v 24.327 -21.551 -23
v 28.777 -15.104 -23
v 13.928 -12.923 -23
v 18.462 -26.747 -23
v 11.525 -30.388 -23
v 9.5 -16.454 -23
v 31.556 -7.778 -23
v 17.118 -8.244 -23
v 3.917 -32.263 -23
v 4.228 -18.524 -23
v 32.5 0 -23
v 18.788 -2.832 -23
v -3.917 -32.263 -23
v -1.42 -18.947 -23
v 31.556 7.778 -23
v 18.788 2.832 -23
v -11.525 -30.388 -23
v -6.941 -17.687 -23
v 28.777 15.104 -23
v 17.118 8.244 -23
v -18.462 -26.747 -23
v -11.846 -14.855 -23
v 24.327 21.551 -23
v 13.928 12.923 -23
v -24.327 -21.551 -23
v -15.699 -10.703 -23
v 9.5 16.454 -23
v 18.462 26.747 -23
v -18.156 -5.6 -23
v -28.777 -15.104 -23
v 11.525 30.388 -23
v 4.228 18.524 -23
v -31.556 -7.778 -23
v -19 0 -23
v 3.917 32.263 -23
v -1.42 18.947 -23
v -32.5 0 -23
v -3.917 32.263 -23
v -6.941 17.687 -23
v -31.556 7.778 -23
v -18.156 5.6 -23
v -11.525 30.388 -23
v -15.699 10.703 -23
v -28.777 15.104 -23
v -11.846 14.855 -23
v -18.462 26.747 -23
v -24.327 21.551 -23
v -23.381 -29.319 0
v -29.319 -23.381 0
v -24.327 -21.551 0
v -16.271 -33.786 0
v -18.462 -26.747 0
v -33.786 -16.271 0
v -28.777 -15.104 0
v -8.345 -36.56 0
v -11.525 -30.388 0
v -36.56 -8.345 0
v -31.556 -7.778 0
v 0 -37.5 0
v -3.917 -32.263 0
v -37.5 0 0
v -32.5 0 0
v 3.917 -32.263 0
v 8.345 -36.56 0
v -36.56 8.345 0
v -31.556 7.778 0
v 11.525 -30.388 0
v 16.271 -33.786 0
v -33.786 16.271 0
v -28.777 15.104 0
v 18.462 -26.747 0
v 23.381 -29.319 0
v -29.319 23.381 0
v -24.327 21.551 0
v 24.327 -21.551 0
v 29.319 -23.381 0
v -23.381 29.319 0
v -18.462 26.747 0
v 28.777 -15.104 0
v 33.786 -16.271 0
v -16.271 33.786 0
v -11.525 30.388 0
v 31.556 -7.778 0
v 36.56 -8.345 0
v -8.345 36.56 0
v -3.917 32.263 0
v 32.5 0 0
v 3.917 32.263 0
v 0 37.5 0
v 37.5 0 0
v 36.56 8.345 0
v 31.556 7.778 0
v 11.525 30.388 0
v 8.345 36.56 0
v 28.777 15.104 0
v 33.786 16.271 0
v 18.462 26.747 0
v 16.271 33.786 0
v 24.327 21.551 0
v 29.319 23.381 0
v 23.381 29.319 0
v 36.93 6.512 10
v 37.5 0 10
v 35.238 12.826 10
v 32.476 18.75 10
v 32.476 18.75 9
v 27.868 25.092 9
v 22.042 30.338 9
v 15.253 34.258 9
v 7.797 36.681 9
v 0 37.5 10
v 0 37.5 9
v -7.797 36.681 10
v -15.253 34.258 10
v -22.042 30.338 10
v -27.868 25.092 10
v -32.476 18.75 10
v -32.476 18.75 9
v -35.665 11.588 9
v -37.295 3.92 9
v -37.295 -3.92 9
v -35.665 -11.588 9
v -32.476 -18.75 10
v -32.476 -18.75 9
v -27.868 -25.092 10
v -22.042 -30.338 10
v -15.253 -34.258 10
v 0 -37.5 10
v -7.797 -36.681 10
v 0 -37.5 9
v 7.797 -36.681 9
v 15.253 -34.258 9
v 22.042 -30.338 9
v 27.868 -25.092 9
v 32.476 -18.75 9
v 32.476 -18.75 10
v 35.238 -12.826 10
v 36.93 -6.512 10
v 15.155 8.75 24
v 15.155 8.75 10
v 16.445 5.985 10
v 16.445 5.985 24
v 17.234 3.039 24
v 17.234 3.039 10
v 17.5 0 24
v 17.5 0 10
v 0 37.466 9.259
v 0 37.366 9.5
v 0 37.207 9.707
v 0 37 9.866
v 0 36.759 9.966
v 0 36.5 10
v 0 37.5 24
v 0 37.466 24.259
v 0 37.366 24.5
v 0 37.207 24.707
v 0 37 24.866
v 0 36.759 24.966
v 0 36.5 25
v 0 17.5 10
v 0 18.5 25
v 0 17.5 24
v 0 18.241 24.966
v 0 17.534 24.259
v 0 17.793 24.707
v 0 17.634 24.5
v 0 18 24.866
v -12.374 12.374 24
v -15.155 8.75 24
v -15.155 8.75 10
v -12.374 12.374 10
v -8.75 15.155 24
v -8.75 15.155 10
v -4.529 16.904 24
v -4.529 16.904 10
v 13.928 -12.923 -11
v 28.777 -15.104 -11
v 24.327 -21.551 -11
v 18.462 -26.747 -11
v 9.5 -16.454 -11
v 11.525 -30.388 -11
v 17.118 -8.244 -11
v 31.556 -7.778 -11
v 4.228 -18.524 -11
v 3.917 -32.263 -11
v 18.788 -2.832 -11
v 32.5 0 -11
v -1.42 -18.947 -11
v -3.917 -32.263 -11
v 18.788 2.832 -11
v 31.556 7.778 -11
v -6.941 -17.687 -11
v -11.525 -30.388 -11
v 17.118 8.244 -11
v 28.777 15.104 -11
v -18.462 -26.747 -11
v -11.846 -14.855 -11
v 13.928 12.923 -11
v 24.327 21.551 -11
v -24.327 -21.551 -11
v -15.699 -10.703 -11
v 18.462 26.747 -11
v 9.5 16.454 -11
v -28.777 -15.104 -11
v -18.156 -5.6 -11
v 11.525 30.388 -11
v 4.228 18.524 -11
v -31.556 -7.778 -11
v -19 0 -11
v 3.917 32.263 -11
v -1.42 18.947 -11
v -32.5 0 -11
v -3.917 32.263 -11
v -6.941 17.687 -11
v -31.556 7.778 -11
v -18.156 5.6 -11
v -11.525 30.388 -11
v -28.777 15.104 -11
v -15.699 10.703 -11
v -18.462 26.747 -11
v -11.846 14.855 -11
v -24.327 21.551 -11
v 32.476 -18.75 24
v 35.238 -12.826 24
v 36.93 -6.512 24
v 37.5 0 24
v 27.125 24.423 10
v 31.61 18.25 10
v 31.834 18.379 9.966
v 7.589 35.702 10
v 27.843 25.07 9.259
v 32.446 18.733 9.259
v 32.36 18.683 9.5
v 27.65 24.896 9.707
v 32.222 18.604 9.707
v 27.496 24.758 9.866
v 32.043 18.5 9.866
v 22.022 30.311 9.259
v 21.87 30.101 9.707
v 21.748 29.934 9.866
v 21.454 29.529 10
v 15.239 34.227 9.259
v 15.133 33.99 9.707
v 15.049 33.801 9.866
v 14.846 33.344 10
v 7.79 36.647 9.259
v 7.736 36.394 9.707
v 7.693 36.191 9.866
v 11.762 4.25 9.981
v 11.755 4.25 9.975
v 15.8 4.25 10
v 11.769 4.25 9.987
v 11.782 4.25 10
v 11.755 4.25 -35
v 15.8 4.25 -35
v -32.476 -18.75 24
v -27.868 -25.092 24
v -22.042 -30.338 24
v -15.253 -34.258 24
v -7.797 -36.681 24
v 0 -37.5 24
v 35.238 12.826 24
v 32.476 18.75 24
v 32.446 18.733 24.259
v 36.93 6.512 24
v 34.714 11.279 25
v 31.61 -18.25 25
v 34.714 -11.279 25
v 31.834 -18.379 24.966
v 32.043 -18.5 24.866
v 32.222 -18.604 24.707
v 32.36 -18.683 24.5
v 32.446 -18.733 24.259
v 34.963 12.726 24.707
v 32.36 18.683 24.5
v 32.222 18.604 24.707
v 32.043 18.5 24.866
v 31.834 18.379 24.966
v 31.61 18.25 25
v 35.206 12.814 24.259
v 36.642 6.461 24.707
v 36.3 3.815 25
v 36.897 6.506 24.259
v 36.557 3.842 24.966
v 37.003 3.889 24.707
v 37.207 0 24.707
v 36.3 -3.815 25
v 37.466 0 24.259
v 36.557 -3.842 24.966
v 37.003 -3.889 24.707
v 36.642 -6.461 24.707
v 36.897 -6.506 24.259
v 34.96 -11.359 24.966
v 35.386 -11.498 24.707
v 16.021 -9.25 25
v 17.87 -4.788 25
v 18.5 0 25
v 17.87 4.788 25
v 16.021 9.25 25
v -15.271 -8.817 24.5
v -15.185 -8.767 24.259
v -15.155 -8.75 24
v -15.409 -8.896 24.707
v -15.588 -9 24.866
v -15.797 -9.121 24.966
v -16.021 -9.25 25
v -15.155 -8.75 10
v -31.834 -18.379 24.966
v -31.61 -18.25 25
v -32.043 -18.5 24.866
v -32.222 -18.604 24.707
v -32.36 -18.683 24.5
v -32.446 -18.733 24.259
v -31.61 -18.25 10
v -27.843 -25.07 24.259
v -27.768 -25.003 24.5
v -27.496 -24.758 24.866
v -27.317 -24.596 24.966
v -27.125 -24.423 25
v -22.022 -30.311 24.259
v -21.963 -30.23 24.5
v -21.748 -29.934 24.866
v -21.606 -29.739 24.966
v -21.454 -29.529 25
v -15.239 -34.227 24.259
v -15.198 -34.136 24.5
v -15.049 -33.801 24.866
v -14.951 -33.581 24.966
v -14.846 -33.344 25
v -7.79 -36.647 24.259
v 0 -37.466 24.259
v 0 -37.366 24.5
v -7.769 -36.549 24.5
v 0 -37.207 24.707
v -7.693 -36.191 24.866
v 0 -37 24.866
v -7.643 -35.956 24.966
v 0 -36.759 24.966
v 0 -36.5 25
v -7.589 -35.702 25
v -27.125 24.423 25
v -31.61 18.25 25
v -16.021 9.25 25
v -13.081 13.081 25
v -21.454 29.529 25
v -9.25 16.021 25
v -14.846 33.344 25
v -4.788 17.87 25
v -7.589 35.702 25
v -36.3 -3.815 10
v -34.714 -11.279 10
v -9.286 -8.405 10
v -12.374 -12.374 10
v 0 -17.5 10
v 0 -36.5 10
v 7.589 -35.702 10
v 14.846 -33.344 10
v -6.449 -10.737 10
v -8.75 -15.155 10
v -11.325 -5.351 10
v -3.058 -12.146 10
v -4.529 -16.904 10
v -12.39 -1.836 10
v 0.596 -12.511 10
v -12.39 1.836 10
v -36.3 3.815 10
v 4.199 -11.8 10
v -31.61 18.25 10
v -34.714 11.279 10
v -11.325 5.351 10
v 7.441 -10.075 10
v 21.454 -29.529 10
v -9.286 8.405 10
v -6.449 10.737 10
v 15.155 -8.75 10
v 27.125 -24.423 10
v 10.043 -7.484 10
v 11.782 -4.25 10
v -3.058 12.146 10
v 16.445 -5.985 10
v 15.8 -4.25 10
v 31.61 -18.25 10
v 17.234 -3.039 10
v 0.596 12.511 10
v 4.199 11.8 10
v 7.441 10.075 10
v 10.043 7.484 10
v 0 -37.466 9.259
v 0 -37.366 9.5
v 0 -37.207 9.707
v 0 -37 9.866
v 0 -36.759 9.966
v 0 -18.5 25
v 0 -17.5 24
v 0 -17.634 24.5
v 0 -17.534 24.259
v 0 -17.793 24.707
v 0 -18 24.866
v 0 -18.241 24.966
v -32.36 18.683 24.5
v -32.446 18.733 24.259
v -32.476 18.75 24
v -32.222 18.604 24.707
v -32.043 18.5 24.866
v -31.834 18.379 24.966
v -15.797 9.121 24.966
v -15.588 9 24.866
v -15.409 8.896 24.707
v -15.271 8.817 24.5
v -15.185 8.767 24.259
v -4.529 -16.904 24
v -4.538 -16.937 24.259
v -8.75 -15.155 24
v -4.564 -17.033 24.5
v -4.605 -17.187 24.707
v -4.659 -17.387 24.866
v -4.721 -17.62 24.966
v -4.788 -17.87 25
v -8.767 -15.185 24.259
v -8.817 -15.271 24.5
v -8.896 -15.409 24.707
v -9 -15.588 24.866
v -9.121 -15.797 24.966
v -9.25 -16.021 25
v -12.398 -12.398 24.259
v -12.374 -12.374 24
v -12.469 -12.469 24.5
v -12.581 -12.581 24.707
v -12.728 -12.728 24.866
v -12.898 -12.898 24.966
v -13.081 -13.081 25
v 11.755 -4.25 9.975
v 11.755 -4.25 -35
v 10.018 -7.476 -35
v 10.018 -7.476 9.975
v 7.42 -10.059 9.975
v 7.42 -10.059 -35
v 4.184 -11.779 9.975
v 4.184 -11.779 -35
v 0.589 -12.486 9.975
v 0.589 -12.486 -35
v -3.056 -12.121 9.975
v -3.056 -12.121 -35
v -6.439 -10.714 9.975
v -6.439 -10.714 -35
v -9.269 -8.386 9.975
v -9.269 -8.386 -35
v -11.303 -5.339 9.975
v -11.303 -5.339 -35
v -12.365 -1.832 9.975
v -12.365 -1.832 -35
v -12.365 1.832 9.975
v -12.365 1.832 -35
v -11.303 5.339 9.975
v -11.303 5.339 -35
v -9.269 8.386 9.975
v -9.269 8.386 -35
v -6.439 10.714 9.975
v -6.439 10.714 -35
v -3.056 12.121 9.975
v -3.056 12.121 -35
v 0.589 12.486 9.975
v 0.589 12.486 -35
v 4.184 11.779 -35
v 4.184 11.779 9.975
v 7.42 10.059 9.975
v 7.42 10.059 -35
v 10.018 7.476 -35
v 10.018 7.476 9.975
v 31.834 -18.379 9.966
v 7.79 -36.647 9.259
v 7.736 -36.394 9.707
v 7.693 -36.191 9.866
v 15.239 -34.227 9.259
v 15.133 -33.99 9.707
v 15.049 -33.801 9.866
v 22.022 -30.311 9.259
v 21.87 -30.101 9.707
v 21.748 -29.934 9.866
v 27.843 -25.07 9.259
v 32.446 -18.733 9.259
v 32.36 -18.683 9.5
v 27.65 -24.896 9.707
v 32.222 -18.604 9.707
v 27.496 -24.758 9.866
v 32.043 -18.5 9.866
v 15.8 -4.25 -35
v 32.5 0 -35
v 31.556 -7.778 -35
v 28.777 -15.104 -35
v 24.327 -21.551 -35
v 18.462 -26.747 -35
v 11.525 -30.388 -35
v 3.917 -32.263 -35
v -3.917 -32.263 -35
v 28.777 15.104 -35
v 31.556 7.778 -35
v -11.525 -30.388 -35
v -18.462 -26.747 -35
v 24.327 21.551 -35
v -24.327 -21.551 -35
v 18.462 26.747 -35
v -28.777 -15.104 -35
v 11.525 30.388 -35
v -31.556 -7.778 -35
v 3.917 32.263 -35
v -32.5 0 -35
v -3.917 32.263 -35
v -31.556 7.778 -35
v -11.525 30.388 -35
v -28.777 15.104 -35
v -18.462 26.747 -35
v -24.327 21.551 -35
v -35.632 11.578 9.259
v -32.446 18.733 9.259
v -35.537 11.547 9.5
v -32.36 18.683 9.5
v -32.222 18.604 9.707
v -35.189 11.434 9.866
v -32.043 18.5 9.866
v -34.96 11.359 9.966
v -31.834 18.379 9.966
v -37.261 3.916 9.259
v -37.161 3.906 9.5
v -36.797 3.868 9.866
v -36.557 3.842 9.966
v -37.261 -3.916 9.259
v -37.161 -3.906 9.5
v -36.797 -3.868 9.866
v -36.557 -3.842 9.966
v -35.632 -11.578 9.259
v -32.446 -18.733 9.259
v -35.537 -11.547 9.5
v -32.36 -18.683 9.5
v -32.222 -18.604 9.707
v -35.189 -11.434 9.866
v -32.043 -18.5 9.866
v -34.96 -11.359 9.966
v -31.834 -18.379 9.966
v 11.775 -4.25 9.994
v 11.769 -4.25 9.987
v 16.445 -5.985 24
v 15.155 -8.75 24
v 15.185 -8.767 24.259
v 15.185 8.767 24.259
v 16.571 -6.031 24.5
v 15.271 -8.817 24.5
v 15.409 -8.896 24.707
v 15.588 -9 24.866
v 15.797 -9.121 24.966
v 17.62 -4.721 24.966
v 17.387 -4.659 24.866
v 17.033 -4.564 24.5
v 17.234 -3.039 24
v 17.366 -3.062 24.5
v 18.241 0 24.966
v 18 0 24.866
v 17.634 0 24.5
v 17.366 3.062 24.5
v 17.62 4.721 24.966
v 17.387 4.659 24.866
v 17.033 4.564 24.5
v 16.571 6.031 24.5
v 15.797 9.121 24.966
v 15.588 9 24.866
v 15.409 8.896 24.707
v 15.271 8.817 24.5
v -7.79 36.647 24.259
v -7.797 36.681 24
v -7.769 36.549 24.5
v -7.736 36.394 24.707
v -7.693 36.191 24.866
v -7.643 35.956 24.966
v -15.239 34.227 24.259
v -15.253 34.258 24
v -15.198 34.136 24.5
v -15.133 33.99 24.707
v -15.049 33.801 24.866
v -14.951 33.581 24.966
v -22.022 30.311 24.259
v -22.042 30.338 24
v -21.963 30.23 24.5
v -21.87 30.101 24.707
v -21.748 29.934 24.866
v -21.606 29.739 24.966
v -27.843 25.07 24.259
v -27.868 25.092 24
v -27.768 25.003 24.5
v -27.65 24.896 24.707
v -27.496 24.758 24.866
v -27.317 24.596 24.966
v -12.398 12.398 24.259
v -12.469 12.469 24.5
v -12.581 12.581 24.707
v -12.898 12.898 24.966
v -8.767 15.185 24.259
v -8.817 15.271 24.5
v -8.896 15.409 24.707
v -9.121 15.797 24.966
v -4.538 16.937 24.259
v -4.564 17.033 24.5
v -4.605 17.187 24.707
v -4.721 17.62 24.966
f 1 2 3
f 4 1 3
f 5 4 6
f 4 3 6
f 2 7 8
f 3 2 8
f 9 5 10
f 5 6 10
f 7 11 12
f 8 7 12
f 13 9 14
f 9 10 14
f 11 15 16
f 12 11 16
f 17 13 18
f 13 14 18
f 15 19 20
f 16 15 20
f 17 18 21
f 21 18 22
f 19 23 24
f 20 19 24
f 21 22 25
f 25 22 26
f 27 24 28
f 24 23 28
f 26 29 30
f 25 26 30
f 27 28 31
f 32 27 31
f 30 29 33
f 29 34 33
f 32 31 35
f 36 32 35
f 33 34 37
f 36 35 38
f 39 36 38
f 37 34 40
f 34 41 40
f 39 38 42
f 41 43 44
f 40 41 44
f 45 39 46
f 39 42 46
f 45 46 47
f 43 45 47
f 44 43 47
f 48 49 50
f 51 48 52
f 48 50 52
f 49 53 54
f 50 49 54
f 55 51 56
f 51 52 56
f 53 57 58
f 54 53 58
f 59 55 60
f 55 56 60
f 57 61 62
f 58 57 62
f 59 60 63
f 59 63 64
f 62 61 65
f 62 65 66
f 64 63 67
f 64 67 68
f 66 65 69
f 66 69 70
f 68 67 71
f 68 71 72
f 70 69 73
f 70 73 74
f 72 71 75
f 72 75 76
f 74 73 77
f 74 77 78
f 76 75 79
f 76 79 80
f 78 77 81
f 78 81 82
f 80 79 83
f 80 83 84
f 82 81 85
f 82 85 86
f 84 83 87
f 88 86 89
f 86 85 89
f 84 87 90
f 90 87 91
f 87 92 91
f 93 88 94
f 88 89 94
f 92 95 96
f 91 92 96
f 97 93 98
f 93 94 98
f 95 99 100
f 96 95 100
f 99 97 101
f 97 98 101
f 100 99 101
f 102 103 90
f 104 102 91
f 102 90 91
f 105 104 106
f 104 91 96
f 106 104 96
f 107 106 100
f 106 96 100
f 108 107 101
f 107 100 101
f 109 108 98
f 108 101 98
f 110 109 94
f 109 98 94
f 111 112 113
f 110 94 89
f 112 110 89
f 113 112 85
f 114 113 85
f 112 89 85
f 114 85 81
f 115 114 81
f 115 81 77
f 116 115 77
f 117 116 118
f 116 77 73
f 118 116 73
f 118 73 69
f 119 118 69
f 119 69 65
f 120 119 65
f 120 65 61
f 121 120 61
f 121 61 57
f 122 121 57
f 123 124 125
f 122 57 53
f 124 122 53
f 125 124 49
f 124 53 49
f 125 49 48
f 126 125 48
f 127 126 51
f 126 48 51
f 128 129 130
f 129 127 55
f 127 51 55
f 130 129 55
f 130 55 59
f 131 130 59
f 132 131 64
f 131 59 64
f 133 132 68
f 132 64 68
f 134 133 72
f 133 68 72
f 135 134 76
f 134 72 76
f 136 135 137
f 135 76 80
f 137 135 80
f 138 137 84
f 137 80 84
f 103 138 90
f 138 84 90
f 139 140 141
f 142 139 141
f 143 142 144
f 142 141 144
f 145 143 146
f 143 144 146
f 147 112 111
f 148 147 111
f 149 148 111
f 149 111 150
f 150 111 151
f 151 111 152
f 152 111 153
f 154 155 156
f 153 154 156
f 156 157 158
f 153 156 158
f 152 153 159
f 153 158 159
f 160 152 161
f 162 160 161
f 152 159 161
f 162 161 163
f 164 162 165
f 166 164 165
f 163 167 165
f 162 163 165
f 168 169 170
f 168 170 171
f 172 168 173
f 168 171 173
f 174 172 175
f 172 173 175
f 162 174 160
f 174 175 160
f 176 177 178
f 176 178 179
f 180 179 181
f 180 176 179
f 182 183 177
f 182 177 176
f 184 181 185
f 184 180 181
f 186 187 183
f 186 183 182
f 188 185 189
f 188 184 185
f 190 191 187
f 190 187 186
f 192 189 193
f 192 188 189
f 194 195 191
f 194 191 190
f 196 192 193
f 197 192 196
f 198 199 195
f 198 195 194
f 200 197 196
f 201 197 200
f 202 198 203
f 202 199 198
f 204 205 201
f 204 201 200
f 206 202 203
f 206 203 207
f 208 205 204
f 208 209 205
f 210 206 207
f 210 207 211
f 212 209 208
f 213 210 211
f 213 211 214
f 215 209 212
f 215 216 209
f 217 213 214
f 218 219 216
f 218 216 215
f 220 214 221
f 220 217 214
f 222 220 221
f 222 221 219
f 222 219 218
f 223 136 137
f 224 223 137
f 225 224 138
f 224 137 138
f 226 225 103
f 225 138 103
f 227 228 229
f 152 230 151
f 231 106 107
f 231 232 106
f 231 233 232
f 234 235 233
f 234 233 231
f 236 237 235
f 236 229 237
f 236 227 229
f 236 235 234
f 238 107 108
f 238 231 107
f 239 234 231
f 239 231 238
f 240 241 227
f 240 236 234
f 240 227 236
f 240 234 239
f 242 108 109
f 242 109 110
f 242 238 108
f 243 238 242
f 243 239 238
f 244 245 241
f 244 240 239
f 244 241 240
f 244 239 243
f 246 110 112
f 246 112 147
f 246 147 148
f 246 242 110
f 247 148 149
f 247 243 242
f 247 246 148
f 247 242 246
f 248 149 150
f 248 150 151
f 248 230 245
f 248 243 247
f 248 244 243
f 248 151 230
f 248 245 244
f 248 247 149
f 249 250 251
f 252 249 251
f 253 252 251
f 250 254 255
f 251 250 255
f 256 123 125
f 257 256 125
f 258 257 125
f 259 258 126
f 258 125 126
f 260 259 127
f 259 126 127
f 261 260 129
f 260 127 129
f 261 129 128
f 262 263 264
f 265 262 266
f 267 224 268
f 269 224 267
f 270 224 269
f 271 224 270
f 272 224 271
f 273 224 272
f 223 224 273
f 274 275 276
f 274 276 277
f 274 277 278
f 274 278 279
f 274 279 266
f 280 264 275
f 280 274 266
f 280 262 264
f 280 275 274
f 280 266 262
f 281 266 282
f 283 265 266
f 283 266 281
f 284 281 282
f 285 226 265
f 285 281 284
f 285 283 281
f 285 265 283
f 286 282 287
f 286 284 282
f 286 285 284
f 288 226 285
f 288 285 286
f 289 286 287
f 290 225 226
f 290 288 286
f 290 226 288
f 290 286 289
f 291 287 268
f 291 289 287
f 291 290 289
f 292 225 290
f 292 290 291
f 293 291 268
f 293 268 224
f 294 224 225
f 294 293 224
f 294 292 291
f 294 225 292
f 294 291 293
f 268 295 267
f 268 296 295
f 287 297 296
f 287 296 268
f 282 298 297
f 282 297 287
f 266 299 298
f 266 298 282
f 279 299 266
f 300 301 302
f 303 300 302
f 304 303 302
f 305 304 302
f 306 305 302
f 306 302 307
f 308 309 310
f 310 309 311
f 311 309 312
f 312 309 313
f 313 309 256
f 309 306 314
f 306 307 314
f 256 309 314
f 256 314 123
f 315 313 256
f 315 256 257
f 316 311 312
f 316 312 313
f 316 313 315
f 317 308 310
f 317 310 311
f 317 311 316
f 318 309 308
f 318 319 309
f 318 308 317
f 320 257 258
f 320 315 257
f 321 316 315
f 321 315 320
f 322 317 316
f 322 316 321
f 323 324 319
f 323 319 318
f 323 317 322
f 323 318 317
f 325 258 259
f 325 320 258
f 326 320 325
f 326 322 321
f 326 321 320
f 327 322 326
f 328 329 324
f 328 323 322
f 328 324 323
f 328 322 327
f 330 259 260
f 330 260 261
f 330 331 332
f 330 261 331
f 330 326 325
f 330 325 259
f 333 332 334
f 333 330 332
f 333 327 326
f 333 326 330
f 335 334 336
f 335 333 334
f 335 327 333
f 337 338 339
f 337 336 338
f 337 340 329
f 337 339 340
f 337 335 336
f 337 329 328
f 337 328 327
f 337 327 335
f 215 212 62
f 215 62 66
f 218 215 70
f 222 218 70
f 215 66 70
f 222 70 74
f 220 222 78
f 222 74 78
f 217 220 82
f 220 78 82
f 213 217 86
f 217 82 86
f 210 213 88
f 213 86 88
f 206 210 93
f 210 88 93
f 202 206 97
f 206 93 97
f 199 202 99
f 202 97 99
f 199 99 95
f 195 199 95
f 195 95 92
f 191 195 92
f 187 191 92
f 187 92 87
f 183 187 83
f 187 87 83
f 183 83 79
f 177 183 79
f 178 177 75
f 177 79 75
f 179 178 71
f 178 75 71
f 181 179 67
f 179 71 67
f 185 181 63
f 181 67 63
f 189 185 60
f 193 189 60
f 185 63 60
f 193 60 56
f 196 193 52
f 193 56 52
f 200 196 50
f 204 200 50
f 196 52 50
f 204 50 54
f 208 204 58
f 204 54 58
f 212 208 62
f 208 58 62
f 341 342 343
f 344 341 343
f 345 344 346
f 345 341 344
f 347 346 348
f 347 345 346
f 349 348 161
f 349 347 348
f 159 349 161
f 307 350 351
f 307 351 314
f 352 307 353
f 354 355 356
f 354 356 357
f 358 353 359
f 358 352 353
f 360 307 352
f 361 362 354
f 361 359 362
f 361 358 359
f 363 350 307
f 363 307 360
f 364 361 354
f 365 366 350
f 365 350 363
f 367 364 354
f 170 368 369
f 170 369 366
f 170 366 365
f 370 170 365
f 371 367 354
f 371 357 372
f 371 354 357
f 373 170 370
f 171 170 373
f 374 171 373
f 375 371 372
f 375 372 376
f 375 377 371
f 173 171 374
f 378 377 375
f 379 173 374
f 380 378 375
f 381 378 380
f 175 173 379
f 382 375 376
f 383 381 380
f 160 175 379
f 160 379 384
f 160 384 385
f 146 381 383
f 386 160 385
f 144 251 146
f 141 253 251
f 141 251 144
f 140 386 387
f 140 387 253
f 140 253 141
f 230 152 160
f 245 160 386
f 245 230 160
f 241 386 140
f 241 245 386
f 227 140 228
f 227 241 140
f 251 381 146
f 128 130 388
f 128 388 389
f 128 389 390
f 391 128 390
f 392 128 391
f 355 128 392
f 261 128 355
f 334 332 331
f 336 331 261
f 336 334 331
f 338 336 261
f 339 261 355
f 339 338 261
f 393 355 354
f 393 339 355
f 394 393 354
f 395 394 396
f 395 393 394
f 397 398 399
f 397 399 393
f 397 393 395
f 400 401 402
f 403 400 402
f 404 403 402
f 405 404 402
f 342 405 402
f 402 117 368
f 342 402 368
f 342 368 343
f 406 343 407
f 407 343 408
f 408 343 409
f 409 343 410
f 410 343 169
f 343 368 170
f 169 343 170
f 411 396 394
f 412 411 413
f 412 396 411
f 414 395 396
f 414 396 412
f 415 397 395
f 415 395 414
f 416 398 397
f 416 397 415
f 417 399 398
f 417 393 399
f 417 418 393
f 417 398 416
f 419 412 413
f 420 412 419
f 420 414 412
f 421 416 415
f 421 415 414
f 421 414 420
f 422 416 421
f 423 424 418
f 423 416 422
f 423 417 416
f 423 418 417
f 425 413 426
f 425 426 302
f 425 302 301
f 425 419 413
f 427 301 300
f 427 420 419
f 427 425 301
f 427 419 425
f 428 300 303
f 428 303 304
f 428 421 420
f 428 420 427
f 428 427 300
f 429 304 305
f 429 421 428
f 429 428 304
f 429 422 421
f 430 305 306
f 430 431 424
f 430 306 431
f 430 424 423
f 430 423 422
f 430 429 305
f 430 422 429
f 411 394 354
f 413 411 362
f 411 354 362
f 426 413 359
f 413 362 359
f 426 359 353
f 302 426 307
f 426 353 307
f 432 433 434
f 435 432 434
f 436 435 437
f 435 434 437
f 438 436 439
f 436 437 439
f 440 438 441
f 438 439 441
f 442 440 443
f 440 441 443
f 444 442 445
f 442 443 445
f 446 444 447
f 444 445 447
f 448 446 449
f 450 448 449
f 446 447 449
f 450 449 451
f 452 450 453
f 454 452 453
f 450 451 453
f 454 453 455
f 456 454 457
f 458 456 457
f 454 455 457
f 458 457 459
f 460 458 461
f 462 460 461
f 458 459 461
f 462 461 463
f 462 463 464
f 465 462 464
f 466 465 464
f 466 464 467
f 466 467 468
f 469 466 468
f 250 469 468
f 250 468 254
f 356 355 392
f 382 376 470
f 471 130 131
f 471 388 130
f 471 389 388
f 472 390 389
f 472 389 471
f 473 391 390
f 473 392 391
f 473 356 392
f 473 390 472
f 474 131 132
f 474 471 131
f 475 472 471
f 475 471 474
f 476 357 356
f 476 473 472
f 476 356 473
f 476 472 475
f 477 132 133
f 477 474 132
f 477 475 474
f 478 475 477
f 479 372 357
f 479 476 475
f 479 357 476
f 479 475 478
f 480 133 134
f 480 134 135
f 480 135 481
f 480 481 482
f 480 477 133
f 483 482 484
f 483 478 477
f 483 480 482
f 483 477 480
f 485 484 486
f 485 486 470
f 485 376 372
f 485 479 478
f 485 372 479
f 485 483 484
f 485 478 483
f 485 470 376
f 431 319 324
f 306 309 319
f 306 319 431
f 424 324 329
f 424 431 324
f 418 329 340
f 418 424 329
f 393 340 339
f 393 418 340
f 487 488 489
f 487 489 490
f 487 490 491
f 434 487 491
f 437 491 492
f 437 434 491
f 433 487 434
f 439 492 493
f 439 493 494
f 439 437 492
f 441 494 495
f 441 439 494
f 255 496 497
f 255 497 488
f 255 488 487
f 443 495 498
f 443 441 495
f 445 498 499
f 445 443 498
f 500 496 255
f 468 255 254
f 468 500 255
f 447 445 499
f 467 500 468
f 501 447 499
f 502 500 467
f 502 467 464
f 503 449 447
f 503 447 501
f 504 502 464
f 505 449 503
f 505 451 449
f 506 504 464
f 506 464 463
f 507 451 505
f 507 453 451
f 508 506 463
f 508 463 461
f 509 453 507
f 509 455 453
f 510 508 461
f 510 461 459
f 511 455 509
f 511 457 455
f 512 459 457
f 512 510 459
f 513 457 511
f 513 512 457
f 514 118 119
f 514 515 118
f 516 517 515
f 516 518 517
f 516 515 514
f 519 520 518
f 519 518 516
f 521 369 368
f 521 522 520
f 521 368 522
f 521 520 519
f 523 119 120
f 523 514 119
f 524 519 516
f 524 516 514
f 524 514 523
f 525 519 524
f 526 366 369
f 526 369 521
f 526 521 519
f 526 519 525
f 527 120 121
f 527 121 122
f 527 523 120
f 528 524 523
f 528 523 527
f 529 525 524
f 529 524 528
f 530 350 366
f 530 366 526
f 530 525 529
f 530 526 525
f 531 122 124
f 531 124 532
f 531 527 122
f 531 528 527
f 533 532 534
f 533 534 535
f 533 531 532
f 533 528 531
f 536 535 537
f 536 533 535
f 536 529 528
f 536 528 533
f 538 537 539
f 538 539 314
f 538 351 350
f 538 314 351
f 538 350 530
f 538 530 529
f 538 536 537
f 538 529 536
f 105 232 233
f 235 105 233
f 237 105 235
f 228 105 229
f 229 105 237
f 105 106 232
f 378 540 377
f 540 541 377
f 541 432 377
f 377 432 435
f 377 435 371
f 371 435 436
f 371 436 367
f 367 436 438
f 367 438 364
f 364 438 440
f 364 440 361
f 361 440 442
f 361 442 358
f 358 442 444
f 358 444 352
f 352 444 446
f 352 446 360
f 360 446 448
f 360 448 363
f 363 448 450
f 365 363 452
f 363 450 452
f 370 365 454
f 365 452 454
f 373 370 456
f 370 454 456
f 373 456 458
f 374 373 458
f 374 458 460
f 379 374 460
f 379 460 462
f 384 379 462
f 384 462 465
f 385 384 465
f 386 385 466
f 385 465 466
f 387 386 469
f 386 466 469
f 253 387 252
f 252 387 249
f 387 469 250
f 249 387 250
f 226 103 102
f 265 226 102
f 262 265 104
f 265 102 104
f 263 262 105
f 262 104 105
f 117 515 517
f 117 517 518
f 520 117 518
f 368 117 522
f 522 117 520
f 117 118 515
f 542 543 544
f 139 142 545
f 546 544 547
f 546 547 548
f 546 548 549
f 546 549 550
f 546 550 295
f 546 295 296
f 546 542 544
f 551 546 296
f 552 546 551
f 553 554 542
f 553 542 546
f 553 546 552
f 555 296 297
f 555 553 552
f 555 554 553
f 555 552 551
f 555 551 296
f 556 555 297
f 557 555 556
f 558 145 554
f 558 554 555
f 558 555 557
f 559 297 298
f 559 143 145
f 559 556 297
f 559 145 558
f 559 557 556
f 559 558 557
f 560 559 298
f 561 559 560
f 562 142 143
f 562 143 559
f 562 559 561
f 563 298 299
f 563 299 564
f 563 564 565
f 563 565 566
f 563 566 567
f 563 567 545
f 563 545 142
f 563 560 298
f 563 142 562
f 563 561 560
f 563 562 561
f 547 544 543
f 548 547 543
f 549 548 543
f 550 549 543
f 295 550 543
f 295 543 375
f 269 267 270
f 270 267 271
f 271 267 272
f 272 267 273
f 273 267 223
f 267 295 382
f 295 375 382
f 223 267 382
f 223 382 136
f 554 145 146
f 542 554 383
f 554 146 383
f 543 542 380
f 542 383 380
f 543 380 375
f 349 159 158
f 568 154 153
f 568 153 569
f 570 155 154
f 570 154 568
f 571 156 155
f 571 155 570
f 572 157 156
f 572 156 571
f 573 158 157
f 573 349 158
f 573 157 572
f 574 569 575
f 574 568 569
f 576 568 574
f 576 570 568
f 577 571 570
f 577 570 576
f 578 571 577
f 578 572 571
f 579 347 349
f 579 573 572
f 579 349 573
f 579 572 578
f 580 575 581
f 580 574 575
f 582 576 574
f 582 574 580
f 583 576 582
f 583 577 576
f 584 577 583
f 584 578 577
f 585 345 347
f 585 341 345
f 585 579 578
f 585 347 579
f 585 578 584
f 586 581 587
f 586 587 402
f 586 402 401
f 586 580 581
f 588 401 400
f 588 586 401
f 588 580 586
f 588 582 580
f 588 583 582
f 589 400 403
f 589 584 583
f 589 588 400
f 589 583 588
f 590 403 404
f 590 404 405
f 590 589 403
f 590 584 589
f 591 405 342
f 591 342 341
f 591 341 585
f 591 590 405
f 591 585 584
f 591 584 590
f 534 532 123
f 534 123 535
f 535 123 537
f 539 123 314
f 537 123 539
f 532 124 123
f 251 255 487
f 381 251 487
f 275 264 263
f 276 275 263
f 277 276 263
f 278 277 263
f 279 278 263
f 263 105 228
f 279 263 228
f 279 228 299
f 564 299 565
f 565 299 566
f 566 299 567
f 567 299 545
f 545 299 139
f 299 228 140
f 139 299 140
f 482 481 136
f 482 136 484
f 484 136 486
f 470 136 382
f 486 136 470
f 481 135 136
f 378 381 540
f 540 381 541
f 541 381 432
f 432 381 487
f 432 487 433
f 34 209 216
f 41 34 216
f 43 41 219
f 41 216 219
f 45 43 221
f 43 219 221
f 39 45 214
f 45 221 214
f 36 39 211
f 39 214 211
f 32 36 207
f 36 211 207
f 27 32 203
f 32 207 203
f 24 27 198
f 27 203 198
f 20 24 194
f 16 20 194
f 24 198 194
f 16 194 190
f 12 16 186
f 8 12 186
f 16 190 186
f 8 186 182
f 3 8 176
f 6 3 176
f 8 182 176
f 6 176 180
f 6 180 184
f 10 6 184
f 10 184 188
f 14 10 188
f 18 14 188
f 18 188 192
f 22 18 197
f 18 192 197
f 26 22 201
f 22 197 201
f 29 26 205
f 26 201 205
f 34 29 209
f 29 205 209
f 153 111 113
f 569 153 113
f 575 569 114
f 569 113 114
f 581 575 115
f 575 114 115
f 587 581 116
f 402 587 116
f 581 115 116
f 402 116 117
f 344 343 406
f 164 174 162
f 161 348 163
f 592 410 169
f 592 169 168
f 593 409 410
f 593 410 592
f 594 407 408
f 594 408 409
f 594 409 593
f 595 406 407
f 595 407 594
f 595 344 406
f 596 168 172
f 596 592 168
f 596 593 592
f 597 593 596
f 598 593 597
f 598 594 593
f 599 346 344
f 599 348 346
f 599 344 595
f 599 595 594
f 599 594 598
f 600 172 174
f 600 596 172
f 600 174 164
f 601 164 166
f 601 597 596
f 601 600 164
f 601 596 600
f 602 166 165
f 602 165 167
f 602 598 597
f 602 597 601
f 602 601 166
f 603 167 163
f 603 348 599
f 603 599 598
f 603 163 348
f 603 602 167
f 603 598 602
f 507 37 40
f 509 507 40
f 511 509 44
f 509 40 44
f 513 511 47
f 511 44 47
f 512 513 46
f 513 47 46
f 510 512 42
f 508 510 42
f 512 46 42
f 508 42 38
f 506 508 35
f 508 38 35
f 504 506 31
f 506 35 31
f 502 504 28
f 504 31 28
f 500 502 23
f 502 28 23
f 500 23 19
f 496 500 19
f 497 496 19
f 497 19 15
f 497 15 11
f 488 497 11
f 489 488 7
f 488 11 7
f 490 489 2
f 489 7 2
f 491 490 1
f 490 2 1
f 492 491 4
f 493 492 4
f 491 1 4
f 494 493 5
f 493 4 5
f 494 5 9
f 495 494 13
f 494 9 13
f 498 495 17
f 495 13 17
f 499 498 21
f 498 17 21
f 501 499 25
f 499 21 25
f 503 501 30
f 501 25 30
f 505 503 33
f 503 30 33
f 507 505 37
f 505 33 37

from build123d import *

# Parameters (mm, degrees)
SKETCH1_R                        = 37.5
BOSS_EXTRUDE1_DEPTH              = 10
SKETCH2_R                        = 32.5
BOSS_EXTRUDE2_DEPTH              = 11
SKETCH3_R                        = 19
BOSS_EXTRUDE3_DEPTH              = 12
SKETCH4_R                        = 32.5
BOSS_EXTRUDE4_DEPTH              = 12
BOSS_EXTRUDE5_DEPTH              = 15
FILLET1_R                        = 1
F_25_0MM_DOWEL_HOLE1_D           = 25
F_25_0MM_DOWEL_HOLE1_CSINK_D     = 25.05
F_25_0MM_DOWEL_HOLE1_CSINK_ANGLE = 90
SKETCH9_W                        = 15.8
SKETCH9_H                        = 44.975
CUT_EXTRUDE2_DEPTH               = 4.25
CUT_EXTRUDE3_DEPTH               = 4.25


with BuildPart() as part:
    # Sketch1 → Boss-Extrude1 (new body)
    with BuildSketch(Plane.XY):
        Circle(SKETCH1_R)
    extrude(amount=BOSS_EXTRUDE1_DEPTH)

    # Sketch2 → Boss-Extrude2 (add)
    with BuildSketch(Plane(origin=(0, 0, 0), x_dir=(-1, 0, 0), z_dir=(0, 0, -1))):
        Circle(SKETCH2_R)
    extrude(amount=BOSS_EXTRUDE2_DEPTH)

    # Sketch3 → Boss-Extrude3 (add)
    with BuildSketch(Plane(origin=(0, 0, -11), x_dir=(-1, 0, 0), z_dir=(0, 0, -1))):
        Circle(SKETCH3_R)
    extrude(amount=BOSS_EXTRUDE3_DEPTH)

    # Sketch4 → Boss-Extrude4 (add)
    with BuildSketch(Plane(origin=(0, 0, -23), x_dir=(-1, 0, 0), z_dir=(0, 0, -1))):
        Circle(SKETCH4_R)
    extrude(amount=BOSS_EXTRUDE4_DEPTH)

    # Sketch5 → Boss-Extrude5 (add)
    with BuildSketch(Plane.XY.offset(10)):
        with BuildLine():
            Line((0, 17.5), (0, 37.5))
            ThreePointArc((0, 37.5), (-18.75, 32.475952642), (-32.475952642, 18.75))
            Line((-32.475952642, 18.75), (-15.155444566, 8.75))
            ThreePointArc((-15.155444566, 8.75), (-8.75, 15.155444566), (0, 17.5))
        make_face()
        with BuildLine():
            Line((-15.155444566, -8.75), (-32.475952642, -18.75))
            ThreePointArc((-32.475952642, -18.75), (-18.75, -32.475952642), (0, -37.5))
            Line((0, -37.5), (0, -17.5))
            ThreePointArc((0, -17.5), (-8.75, -15.155444566), (-15.155444566, -8.75))
        make_face()
        with BuildLine():
            ThreePointArc((37.5, 0), (36.222218486, 9.705714191), (32.475952642, 18.75))
            Line((32.475952642, 18.75), (15.155444566, 8.75))
            ThreePointArc((15.155444566, 8.75), (16.90370196, 4.529333289), (17.5, 0))
            ThreePointArc((17.5, 0), (16.90370196, -4.529333289), (15.155444566, -8.75))
            Line((15.155444566, -8.75), (32.475952642, -18.75))
            ThreePointArc((32.475952642, -18.75), (36.222218486, -9.705714191), (37.5, 0))
        make_face()
    extrude(amount=BOSS_EXTRUDE5_DEPTH)

    # Fillet1
    # the kernel refuses this fillet: 1 mm, written as the material it takes off along each edge
    with BuildSketch(Plane(origin=(0, 0, 10), x_dir=(-0.8660254037844362, 0.5000000000000042, 0), z_dir=(0.5000000000000042, 0.8660254037844362, 0))) as fillet1_piece_1:
        with BuildLine():
            CenterArc((37.5 - FILLET1_R, -FILLET1_R), FILLET1_R, 0, 90)
            Line((37.5 - FILLET1_R, 0), (37.5, 0))
            Line((37.5, 0), (37.5, -FILLET1_R))
        make_face()
    revolve(axis=Axis((0, 0, 10), (0, 0, 1)), revolution_arc=60, mode=Mode.SUBTRACT)
    with BuildSketch(Plane(origin=(0, 0, 25), x_dir=(-0.9283987696572769, 0.37158542019144725, 0), z_dir=(-0.37158542019144725, -0.9283987696572769, 0))) as fillet1_piece_2:
        with BuildLine():
            CenterArc((17.5 + FILLET1_R, FILLET1_R), FILLET1_R, 180, 90)
            Line((17.5 + FILLET1_R, 0), (17.5, 0))
            Line((17.5, 0), (17.5, FILLET1_R))
        make_face()
    revolve(axis=Axis((0, 0, 25), (0, 0, -1)), revolution_arc=76.373144951, mode=Mode.SUBTRACT)
    with BuildSketch(Plane(origin=(0, 0, 25), x_dir=(0.06662916908749308, 0.9977778078443669, 0), z_dir=(0.9977778078443669, -0.06662916908749308, 0))) as fillet1_piece_3:
        with BuildLine():
            CenterArc((37.5 - FILLET1_R, -FILLET1_R), FILLET1_R, 0, 90)
            Line((37.5 - FILLET1_R, 0), (37.5, 0))
            Line((37.5, 0), (37.5, -FILLET1_R))
        make_face()
    revolve(axis=Axis((0, 0, 25), (0, 0, 1)), revolution_arc=67.640800977, mode=Mode.SUBTRACT)
    with BuildSketch(Plane(origin=(0, 0, 10), x_dir=(0, -1, 0), z_dir=(-1, 0, 0))) as fillet1_piece_4:
        with BuildLine():
            CenterArc((37.5 - FILLET1_R, -FILLET1_R), FILLET1_R, 0, 90)
            Line((37.5 - FILLET1_R, 0), (37.5, 0))
            Line((37.5, 0), (37.5, -FILLET1_R))
        make_face()
    revolve(axis=Axis((0, 0, 10), (0, 0, 1)), revolution_arc=60, mode=Mode.SUBTRACT)
    with BuildSketch(Plane(origin=(0, 0, 25), x_dir=(0.14239697126692002, -0.9898096294611445, 0), z_dir=(0.9898096294611445, 0.14239697126692002, 0))) as fillet1_piece_5:
        with BuildLine():
            CenterArc((17.5 + FILLET1_R, FILLET1_R), FILLET1_R, 180, 90)
            Line((17.5 + FILLET1_R, 0), (17.5, 0))
            Line((17.5, 0), (17.5, FILLET1_R))
        make_face()
    revolve(axis=Axis((0, 0, 25), (0, 0, -1)), revolution_arc=76.373144951, mode=Mode.SUBTRACT)
    with BuildSketch(Plane(origin=(0, 0, 25), x_dir=(-0.8974155134693206, -0.44118635085935703, 0), z_dir=(-0.44118635085935703, 0.8974155134693206, 0))) as fillet1_piece_6:
        with BuildLine():
            CenterArc((37.5 - FILLET1_R, -FILLET1_R), FILLET1_R, 0, 90)
            Line((37.5 - FILLET1_R, 0), (37.5, 0))
            Line((37.5, 0), (37.5, -FILLET1_R))
        make_face()
    revolve(axis=Axis((0, 0, 25), (0, 0, 1)), revolution_arc=67.640800977, mode=Mode.SUBTRACT)
    with BuildSketch(Plane(origin=(0, 0, 10), x_dir=(0.8660254037844433, 0.49999999999999195, 0), z_dir=(0.49999999999999195, -0.8660254037844433, 0))) as fillet1_piece_7:
        with BuildLine():
            CenterArc((37.5 - FILLET1_R, -FILLET1_R), FILLET1_R, 0, 90)
            Line((37.5 - FILLET1_R, 0), (37.5, 0))
            Line((37.5, 0), (37.5, -FILLET1_R))
        make_face()
    revolve(axis=Axis((0, 0, 10), (0, 0, 1)), revolution_arc=60, mode=Mode.SUBTRACT)
    with BuildSketch(Plane(origin=(0, 0, 25), x_dir=(0.7860017983903416, -0.6182242092697025, 0), z_dir=(-0.6182242092697025, -0.7860017983903416, 0))) as fillet1_piece_8:
        with BuildLine():
            CenterArc((17.5 + FILLET1_R, -FILLET1_R), FILLET1_R, 90, 90)
            Line((17.5, -FILLET1_R), (17.5, 0))
            Line((17.5, 0), (17.5 + FILLET1_R, 0))
        make_face()
    revolve(axis=Axis((0, 0, 25), (0, 0, 1)), revolution_arc=76.373144951, mode=Mode.SUBTRACT)
    with BuildSketch(Plane(origin=(0, 0, 25), x_dir=(0.8307863443818282, 0.5565914569849941, 0), z_dir=(-0.5565914569849941, 0.8307863443818282, 0))) as fillet1_piece_9:
        with BuildLine():
            CenterArc((37.5 - FILLET1_R, FILLET1_R), FILLET1_R, 270, 90)
            Line((37.5 - FILLET1_R, 0), (37.5, 0))
            Line((37.5, 0), (37.5, FILLET1_R))
        make_face()
    revolve(axis=Axis((0, 0, 25), (0, 0, -1)), revolution_arc=67.640800977, mode=Mode.SUBTRACT)

    # Ø25.0mm Dowel Hole1 (through all)
    with Locations(Plane.XY.offset(10)):
        with Locations((0, 0)):
            CounterSinkHole(F_25_0MM_DOWEL_HOLE1_D / 2, F_25_0MM_DOWEL_HOLE1_CSINK_D / 2, counter_sink_angle=F_25_0MM_DOWEL_HOLE1_CSINK_ANGLE)

    # Sketch9 → Cut-Extrude2 (cut, symmetric)
    with BuildSketch(Plane(origin=(0, 0, 0), x_dir=(1, 0, 0), z_dir=(0, 1, 0))):
        with Locations((7.9, 12.5125)):
            Rectangle(SKETCH9_W, SKETCH9_H)
    extrude(amount=CUT_EXTRUDE2_DEPTH, both=True, mode=Mode.SUBTRACT)

    # Sketch12 → Cut-Extrude3 (cut, symmetric)
    with BuildSketch(Plane(origin=(0, 0, 9.975), x_dir=(-1, 0, 0), z_dir=(0, 0, -1))):
        with BuildLine():
            Line((-11.755317946, 4.25), (-15.8, 4.25))
            Line((-15.8, 4.25), (-15.8, -4.25))
            Line((-15.8, -4.25), (-11.755317946, -4.25))
            ThreePointArc((-11.755317946, -4.25), (-12.5, 0), (-11.755317946, 4.25))
        make_face()
    extrude(amount=CUT_EXTRUDE3_DEPTH, both=True, mode=Mode.SUBTRACT)


solid = part.part
